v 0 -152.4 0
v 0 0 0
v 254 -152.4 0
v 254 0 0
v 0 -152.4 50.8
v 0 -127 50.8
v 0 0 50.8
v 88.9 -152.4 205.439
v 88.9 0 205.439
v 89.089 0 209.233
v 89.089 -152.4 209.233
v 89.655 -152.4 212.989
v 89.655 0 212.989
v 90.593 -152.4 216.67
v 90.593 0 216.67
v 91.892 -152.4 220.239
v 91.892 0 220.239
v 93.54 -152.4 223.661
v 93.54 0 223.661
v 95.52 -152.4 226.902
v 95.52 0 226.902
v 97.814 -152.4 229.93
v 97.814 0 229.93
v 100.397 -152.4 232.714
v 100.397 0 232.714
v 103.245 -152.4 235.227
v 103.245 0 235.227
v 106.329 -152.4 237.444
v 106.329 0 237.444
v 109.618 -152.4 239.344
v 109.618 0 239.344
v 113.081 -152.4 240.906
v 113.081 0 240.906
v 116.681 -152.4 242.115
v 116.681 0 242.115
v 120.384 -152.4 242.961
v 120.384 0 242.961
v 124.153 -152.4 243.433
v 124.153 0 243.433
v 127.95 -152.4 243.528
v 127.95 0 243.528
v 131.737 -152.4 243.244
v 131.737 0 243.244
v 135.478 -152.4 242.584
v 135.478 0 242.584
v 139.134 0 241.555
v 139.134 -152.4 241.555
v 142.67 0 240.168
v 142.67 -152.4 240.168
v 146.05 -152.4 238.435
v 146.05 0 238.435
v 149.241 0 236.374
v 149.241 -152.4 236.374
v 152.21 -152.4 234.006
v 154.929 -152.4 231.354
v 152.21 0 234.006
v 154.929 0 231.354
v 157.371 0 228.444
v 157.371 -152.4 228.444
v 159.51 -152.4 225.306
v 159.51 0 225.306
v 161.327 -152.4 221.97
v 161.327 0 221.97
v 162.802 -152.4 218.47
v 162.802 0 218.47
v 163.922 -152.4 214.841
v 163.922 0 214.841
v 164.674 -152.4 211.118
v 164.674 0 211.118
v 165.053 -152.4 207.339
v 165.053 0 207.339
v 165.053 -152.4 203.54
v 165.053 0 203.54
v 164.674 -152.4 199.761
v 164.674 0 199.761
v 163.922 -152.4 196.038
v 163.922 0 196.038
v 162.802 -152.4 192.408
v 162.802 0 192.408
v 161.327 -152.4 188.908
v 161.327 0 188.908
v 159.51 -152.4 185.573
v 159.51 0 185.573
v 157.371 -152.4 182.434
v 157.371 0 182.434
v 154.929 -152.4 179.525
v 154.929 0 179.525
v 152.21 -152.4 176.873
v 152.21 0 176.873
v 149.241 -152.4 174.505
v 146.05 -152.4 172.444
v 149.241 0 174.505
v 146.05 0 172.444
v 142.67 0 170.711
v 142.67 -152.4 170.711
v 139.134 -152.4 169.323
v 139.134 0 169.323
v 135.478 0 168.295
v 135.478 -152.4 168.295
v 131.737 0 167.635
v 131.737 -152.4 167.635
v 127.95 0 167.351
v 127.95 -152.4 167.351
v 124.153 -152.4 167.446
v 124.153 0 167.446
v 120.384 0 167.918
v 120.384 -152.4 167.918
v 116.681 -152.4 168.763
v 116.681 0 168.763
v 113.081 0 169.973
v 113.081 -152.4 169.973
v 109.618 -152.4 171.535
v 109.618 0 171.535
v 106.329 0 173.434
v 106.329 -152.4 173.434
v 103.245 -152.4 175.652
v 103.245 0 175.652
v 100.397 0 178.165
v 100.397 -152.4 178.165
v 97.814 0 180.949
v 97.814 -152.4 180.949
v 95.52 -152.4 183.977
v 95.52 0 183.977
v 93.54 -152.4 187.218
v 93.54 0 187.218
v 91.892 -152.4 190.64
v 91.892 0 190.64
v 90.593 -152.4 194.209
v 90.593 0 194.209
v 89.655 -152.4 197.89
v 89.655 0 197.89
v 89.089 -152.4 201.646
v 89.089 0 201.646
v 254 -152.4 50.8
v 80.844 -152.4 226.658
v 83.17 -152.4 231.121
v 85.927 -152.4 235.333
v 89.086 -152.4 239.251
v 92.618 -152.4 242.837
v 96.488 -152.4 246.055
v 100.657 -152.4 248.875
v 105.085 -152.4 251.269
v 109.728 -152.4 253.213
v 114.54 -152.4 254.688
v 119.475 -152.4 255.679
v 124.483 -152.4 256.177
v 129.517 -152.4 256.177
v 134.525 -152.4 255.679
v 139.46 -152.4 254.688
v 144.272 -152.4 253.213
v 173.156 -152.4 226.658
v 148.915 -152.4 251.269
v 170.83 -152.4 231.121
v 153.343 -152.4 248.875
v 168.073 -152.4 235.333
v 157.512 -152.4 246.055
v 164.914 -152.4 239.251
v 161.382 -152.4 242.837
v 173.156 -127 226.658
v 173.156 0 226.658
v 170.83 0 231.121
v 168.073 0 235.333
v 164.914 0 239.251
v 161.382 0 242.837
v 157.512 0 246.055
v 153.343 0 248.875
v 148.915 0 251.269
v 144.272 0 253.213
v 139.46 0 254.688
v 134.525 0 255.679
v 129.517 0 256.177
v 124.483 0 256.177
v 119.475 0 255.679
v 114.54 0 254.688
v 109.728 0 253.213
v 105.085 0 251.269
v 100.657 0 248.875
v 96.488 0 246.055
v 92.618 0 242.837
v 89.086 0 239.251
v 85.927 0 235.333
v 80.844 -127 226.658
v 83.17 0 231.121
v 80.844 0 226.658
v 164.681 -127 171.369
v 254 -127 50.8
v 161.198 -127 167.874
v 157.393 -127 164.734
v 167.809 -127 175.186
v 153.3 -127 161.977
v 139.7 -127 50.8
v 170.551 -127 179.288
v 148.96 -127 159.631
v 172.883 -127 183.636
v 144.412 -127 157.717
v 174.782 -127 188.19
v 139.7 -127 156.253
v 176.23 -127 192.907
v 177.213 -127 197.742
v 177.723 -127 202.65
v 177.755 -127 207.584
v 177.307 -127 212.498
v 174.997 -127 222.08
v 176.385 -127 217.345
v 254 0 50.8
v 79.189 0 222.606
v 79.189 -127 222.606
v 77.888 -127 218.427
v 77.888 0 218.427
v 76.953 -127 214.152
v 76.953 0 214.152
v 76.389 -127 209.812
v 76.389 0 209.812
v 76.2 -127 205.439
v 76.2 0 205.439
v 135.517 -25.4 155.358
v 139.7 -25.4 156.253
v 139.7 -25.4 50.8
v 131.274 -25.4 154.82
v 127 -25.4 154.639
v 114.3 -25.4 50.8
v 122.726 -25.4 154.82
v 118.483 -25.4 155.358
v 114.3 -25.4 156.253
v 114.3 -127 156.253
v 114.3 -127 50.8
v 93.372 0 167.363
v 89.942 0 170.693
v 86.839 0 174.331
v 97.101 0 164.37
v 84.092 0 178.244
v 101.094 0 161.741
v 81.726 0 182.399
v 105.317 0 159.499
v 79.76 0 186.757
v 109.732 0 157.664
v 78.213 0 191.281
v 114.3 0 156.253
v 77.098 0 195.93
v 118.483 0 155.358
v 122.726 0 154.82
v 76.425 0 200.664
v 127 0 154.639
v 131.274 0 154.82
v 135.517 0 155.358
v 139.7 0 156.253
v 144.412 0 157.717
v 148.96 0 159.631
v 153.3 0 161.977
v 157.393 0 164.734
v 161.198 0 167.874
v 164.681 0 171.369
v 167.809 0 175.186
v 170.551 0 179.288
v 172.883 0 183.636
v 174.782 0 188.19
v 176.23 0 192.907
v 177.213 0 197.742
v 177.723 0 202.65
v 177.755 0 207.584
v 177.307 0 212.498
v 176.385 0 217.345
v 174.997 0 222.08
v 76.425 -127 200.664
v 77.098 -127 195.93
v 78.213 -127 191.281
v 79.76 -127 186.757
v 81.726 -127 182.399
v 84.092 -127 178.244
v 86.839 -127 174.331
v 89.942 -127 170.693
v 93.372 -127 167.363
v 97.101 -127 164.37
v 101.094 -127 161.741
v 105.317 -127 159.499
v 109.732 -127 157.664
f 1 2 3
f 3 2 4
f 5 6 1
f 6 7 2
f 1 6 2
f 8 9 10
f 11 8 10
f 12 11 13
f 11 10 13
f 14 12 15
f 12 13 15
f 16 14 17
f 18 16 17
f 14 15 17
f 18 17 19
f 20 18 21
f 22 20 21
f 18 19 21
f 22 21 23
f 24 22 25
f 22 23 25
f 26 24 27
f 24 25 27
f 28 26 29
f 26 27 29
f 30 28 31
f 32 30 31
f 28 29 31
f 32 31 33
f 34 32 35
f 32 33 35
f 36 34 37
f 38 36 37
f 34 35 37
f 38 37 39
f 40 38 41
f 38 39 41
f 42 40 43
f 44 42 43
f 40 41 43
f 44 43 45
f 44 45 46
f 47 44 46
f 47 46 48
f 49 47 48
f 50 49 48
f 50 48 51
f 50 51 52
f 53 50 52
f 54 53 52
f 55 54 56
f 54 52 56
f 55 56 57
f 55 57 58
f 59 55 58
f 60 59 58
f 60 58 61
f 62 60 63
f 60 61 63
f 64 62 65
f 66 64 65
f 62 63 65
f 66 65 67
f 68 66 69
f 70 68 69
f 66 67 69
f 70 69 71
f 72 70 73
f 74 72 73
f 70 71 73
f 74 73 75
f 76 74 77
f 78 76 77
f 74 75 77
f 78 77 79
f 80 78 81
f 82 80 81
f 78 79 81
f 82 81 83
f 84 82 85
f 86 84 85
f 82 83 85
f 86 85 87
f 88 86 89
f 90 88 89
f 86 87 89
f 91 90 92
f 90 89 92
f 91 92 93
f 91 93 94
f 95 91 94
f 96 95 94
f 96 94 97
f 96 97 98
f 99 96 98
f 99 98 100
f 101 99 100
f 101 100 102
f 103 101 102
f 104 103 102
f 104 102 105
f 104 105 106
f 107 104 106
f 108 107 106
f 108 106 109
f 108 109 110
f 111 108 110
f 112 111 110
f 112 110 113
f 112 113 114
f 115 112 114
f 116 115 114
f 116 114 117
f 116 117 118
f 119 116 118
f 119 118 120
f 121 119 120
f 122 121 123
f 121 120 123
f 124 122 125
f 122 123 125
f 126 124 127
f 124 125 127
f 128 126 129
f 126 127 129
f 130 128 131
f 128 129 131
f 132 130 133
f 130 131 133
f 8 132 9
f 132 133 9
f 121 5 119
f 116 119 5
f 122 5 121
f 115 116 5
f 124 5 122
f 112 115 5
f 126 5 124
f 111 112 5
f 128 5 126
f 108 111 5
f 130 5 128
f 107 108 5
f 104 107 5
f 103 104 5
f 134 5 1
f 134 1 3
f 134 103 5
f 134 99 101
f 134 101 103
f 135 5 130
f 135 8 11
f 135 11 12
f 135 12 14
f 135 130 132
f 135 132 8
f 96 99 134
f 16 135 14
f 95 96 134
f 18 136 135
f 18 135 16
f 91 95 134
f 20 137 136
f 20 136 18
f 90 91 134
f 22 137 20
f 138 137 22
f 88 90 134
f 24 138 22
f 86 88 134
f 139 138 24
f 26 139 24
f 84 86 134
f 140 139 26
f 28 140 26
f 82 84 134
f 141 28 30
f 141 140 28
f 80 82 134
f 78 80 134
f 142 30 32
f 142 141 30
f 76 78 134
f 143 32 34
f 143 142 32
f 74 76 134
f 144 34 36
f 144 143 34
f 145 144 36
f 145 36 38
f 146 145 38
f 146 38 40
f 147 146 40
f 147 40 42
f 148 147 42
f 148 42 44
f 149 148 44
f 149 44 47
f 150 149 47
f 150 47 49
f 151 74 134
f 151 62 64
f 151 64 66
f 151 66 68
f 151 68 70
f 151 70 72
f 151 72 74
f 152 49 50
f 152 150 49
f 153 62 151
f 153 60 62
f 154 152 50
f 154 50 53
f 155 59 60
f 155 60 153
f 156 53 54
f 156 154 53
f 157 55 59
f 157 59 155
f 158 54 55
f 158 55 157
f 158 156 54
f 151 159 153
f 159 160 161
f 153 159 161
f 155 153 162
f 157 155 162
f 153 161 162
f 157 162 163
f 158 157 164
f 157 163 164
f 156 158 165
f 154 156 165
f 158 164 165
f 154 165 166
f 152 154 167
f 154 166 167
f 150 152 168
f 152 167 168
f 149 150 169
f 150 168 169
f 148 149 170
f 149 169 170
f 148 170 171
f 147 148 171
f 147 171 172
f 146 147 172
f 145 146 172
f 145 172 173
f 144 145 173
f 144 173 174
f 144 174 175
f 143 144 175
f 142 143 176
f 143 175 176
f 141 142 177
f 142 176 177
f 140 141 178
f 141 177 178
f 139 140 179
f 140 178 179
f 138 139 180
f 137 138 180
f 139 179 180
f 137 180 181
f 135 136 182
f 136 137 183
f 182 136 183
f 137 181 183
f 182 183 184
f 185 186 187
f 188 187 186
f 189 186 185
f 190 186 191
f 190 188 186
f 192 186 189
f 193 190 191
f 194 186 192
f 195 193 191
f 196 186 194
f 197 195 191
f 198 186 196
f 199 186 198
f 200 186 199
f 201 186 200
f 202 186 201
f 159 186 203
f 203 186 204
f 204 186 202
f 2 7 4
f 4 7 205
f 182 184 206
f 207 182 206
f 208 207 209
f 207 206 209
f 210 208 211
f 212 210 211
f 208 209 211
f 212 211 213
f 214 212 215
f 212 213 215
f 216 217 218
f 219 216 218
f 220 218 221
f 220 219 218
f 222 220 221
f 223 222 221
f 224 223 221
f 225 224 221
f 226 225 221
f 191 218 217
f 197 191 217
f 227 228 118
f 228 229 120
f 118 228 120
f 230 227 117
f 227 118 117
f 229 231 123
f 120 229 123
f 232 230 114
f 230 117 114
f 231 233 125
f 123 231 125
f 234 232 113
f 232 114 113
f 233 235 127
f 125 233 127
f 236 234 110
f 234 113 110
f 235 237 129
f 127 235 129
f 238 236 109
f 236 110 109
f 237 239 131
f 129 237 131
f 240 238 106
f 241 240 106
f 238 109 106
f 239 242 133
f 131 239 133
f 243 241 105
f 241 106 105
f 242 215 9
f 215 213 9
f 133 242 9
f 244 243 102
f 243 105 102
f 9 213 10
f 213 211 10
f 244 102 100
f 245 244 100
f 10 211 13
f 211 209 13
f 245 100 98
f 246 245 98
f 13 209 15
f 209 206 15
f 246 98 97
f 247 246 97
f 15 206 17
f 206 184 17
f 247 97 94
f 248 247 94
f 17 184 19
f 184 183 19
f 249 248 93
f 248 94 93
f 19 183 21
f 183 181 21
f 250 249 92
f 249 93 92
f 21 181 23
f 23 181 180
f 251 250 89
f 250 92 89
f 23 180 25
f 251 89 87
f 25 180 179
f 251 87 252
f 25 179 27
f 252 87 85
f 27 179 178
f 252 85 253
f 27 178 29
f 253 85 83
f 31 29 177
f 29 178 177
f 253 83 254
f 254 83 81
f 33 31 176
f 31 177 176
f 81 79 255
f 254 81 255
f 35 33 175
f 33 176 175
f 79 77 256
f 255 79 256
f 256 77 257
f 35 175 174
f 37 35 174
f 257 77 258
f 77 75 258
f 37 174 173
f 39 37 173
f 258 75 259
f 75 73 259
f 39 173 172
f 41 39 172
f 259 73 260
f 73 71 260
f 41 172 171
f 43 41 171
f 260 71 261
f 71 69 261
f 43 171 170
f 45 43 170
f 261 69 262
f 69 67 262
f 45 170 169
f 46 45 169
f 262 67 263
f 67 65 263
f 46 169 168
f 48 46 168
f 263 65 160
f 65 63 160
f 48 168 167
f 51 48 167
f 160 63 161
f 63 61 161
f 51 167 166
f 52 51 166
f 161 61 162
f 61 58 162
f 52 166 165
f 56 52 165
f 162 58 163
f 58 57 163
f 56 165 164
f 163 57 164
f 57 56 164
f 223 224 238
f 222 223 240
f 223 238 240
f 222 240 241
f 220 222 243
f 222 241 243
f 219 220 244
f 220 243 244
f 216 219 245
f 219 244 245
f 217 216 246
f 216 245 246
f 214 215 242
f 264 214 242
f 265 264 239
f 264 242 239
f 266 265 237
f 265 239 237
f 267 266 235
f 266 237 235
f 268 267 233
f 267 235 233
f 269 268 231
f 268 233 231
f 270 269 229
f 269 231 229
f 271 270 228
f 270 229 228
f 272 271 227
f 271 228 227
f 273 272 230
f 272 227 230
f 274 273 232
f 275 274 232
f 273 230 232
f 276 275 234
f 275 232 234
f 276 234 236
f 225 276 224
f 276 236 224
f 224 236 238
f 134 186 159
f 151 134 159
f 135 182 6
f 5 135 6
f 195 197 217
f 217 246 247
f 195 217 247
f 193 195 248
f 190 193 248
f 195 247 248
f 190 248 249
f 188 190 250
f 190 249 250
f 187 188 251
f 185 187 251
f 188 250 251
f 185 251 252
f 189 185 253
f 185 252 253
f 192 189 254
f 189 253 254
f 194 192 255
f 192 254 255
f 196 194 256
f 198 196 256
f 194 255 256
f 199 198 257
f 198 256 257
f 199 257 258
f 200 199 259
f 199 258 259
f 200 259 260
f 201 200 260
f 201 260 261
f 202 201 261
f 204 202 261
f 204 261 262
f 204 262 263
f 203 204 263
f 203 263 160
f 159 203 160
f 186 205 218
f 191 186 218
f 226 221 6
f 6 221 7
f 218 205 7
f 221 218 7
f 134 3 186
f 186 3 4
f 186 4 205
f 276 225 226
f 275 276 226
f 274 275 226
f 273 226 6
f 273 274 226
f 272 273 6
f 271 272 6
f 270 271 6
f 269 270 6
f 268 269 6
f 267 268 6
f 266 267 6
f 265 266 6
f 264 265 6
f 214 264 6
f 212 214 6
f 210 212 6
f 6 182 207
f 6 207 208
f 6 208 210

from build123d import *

# Parameters (mm, degrees)
F1_DEPTH = 152.4
F2_R     = 38.1
F3_DEPTH = 152.4
F5_DEPTH = 127
F7_DEPTH = 25.4


with BuildPart() as f1:
    # F0 (on Front) → F1 (new body)
    with BuildSketch(Plane.XZ):
        with BuildLine():
            Line((0, 50.8), (0, 0))
            Line((0, 0), (127, 0))
            Line((127, 0), (127, 154.6394254648))
            ThreePointArc((127, 154.6394254648), (84.2300226684, 178.0283138665), (80.8435975712, 226.6579672344))
            Line((80.8435975712, 226.6579672344), (0, 50.8))
        make_face()
        with BuildLine():
            Line((127, 154.6394254648), (127, 0))
            Line((127, 0), (254, 0))
            Line((254, 0), (254, 50.8))
            Line((254, 50.8), (173.1564024288, 226.6579672344))
            ThreePointArc((173.1564024288, 226.6579672344), (176.6255238934, 216.2997835762), (177.8, 205.4394254648))
            ThreePointArc((177.8, 205.4394254648), (162.9210244843, 169.5184009805), (127, 154.6394254648))
        make_face()
        with BuildLine():
            ThreePointArc((80.8435975712, 226.6579672344), (84.2300226684, 178.0283138665), (127, 154.6394254648))
            ThreePointArc((127, 154.6394254648), (162.9210244843, 169.5184009805), (177.8, 205.4394254648))
            ThreePointArc((177.8, 205.4394254648), (176.6255238934, 216.2997835762), (173.1564024288, 226.6579672344))
            ThreePointArc((173.1564024288, 226.6579672344), (127, 256.2394254648), (80.8435975712, 226.6579672344))
        make_face()
    extrude(amount=F1_DEPTH)

    # F2 (on face) → F3 (cut)
    with BuildSketch(Plane(origin=(0, 0, 0), x_dir=(-1, 0, 0), z_dir=(0, 1, 0))):
        with Locations((-127, 205.4394254648)):
            Circle(F2_R)
    extrude(amount=-F3_DEPTH, mode=Mode.SUBTRACT)

    # F4 (on face) → F5 (cut)
    with BuildSketch(Plane(origin=(0, 0, 0), x_dir=(-1, 0, 0), z_dir=(0, 1, 0))):
        with BuildLine():
            Line((-173.1564024288, 226.6579672344), (-254, 50.8))
            Line((-254, 50.8), (-139.7, 50.8))
            Line((-139.7, 50.8), (-139.7, 156.2525369679))
            ThreePointArc((-139.7, 156.2525369679), (-172.8830053448, 183.6359894848), (-173.1564024288, 226.6579672344))
        make_face()
        with BuildLine():
            Line((0, 50.8), (-80.8435975712, 226.6579672344))
            ThreePointArc((-80.8435975712, 226.6579672344), (-77.3744761066, 216.2997835762), (-76.2, 205.4394254648))
            ThreePointArc((-76.2, 205.4394254648), (-86.8390737159, 174.3309057314), (-114.3, 156.2525369679))
            Line((-114.3, 156.2525369679), (-114.3, 109.0697127324))
            Line((-114.3, 109.0697127324), (-114.3, 50.8))
            Line((-114.3, 50.8), (0, 50.8))
        make_face()
    extrude(amount=-F5_DEPTH, mode=Mode.SUBTRACT)

    # F6 (on face) → F7 (cut)
    with BuildSketch(Plane(origin=(0, 0, 0), x_dir=(-1, 0, 0), z_dir=(0, 1, 0))):
        with BuildLine():
            ThreePointArc((-114.3, 156.2525369679), (-127, 154.6394254648), (-139.7, 156.2525369679))
            Line((-139.7, 156.2525369679), (-139.7, 50.8))
            Line((-139.7, 50.8), (-114.3, 50.8))
            Line((-114.3, 50.8), (-114.3, 156.2525369679))
        make_face()
    extrude(amount=-F7_DEPTH, mode=Mode.SUBTRACT)


solid = f1.part
